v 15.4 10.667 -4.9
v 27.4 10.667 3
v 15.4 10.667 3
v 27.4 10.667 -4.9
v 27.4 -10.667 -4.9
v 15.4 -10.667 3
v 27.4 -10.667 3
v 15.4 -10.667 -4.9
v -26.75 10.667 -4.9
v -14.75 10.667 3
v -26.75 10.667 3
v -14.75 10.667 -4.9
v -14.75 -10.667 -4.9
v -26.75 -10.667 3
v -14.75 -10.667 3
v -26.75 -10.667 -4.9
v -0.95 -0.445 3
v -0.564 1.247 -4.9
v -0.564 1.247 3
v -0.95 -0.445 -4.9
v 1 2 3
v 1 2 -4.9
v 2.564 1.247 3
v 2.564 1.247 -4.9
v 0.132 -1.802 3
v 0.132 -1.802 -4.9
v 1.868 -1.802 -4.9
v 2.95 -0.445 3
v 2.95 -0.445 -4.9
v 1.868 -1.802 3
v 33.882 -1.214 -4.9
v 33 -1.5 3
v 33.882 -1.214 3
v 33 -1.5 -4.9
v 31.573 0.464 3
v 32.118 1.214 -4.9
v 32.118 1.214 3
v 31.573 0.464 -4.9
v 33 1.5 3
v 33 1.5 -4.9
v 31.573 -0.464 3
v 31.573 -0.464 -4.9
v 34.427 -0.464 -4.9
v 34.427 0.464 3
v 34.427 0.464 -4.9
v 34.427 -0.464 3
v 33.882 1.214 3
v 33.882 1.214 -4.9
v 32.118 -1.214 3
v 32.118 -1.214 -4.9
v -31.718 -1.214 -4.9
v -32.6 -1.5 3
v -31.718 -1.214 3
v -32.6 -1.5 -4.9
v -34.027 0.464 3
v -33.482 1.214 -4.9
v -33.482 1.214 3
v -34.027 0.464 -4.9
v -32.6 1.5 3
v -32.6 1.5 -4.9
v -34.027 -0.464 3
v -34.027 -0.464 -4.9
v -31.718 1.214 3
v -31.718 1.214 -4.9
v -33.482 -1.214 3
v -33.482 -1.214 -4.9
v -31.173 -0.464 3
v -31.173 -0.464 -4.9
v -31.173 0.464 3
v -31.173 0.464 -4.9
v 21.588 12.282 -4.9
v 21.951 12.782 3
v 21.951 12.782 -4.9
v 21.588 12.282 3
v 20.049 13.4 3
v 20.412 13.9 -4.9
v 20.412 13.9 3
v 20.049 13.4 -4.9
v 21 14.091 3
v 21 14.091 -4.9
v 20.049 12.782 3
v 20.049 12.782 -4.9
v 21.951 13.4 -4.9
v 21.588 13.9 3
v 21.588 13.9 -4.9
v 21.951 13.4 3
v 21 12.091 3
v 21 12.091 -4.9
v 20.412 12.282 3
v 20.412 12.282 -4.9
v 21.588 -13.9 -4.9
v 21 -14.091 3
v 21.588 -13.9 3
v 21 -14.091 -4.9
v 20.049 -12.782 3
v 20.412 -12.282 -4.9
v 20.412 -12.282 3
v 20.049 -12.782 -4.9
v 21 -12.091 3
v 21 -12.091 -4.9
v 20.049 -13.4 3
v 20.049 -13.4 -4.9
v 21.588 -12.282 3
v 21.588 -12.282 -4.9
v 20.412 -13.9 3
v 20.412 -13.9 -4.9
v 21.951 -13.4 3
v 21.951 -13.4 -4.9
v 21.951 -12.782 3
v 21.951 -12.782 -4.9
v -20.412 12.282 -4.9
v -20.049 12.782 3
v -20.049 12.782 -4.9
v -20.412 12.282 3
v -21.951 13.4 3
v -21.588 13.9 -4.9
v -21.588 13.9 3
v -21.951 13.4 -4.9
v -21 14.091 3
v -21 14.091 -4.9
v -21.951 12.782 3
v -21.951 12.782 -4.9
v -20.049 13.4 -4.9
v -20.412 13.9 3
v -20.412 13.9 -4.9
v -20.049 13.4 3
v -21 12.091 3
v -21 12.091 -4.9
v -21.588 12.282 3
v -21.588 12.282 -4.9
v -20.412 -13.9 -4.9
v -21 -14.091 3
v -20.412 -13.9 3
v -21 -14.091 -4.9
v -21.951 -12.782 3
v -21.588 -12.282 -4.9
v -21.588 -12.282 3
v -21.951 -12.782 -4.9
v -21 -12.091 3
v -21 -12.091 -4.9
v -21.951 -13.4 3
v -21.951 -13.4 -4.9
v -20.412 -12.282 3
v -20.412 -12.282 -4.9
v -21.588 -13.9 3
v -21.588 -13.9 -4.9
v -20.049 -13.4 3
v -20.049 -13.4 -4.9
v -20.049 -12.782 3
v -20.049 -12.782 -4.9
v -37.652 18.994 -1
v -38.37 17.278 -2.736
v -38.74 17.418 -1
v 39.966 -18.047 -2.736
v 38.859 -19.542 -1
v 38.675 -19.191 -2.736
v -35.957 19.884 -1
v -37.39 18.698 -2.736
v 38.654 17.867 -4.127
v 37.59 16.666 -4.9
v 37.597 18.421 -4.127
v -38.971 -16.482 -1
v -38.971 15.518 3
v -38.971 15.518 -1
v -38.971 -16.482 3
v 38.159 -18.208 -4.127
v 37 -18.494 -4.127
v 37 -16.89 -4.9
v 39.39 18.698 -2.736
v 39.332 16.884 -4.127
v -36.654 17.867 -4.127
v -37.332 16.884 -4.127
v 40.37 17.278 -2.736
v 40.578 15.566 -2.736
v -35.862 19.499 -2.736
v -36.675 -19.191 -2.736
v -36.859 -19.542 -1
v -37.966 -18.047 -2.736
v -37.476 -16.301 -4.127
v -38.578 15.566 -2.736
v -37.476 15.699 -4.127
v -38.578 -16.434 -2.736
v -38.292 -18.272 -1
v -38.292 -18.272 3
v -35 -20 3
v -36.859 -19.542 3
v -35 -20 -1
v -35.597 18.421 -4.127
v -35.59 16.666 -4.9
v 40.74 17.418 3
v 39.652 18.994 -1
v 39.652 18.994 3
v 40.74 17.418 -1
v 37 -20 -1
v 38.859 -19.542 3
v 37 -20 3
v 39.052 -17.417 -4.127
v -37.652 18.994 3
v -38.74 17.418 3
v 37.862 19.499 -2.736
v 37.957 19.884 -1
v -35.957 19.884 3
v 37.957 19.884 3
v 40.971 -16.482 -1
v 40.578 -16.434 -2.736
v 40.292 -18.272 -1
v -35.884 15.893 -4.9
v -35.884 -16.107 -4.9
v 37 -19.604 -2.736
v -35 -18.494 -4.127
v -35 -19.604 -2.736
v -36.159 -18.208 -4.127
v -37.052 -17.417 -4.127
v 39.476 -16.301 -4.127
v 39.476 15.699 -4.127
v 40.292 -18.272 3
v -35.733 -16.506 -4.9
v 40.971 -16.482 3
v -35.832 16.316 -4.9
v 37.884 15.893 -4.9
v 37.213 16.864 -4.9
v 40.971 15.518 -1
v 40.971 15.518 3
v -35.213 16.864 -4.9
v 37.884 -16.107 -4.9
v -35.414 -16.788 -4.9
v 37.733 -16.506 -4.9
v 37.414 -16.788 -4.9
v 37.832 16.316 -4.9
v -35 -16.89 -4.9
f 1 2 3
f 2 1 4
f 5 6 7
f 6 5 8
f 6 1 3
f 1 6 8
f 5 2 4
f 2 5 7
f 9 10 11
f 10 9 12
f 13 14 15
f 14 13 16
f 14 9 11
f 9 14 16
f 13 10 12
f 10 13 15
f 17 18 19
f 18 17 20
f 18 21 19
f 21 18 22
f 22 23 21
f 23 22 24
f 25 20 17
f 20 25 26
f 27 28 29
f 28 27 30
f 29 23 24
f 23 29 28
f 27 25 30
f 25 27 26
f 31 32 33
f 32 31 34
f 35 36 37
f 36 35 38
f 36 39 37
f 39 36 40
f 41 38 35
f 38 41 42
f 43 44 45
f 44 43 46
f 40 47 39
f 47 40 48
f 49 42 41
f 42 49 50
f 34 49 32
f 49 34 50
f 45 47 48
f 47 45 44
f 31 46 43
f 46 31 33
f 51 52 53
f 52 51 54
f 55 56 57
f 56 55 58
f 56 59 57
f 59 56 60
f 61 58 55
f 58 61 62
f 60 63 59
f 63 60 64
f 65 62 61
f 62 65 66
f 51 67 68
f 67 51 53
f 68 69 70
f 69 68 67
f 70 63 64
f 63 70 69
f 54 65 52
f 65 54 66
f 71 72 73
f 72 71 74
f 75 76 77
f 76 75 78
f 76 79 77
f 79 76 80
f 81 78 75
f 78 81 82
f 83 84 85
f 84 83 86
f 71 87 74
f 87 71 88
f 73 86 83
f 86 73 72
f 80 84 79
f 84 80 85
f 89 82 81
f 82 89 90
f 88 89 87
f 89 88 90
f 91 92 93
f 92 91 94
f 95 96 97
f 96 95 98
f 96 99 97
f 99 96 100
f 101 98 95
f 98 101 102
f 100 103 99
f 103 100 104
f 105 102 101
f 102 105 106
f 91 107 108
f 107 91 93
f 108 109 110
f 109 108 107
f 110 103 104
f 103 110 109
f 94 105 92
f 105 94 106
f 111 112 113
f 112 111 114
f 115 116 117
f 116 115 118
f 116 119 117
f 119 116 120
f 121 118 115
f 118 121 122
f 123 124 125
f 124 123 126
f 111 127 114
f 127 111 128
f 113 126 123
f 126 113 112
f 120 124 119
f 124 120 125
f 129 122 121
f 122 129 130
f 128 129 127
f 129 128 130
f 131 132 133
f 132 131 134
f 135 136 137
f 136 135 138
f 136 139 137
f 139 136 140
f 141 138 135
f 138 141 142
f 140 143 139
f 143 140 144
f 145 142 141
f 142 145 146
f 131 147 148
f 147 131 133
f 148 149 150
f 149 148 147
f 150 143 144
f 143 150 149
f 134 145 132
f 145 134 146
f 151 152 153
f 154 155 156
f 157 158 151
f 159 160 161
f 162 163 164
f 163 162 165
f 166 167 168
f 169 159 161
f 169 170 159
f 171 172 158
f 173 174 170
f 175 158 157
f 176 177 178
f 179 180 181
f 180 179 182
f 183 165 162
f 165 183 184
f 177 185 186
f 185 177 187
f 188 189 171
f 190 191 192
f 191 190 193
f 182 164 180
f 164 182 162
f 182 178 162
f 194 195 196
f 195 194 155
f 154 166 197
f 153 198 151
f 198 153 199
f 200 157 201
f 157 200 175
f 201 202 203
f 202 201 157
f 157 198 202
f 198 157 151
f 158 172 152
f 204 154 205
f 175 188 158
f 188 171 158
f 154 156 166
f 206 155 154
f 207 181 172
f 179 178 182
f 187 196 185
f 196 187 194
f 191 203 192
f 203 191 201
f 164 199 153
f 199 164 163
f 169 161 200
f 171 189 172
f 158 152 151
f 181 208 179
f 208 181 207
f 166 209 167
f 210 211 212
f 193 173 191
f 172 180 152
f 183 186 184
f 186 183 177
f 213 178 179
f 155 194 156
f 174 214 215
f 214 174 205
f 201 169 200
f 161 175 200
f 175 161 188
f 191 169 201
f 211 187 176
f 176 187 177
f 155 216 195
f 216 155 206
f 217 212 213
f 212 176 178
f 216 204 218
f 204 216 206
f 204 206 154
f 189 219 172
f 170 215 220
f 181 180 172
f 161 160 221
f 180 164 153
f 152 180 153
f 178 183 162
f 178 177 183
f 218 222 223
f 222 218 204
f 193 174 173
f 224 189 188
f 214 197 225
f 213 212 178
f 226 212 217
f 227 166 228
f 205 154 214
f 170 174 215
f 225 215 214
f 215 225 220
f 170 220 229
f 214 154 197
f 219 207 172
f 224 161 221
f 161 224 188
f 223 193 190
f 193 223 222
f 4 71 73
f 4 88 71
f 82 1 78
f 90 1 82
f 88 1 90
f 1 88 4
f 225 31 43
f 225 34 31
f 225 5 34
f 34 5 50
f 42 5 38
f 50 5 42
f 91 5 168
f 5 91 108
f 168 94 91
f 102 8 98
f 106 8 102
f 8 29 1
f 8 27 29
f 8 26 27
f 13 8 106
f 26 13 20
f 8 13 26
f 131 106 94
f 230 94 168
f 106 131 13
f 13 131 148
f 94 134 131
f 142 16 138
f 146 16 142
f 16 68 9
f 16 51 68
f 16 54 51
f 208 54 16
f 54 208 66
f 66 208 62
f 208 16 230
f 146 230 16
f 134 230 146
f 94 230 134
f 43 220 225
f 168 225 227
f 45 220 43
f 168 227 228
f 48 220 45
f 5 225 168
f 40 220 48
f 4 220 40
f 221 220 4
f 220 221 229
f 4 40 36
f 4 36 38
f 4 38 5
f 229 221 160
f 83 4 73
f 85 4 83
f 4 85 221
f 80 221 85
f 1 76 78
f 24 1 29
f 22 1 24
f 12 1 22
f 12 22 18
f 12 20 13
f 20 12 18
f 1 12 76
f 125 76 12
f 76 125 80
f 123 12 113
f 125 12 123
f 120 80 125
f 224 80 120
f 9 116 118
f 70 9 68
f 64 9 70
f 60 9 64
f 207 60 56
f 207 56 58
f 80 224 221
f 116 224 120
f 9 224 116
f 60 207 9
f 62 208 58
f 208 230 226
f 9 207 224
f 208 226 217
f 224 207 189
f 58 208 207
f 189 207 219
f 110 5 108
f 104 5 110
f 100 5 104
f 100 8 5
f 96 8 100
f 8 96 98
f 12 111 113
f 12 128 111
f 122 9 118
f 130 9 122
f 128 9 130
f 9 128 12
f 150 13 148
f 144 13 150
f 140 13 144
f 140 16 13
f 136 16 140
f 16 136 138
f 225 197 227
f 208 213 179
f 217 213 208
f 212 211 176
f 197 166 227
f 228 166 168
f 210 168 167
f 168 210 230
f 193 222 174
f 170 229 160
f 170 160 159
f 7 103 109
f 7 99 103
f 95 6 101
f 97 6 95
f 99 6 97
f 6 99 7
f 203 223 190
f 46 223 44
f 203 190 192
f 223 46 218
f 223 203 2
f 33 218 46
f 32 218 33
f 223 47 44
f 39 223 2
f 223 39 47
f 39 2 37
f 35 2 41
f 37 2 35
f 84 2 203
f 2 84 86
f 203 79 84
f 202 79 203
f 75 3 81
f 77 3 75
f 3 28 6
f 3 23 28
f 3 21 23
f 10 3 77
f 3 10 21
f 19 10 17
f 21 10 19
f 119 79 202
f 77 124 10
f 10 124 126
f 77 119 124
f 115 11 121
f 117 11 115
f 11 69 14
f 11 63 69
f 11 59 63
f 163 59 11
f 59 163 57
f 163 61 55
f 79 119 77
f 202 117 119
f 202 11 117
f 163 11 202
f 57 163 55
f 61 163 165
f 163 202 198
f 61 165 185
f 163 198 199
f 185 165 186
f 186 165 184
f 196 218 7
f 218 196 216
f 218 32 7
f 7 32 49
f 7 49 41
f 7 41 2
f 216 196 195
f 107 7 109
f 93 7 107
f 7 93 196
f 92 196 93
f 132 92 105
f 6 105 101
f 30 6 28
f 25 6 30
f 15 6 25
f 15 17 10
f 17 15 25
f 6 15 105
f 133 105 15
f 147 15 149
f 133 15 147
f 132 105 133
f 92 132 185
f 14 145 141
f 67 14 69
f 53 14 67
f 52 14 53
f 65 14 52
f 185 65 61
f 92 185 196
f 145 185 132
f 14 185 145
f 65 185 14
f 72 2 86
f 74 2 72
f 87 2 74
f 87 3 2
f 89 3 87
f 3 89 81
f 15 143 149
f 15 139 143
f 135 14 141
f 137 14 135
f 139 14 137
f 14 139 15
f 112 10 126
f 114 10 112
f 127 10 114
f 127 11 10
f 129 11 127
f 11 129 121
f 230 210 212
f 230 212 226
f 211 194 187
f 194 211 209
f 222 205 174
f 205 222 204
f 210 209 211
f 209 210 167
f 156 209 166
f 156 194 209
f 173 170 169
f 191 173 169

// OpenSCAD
cubo_X = 32;
cubo_Y = 36;
cubo_Z = 4;
cubo_Radio = 4;

module crearCubo() {
    rotate([0,180,0])
    hull() {
    for (i=[0:3])
        translate([(i % 2) * cubo_X, (i - i % 2) * cubo_Y, 0]) {
            cylinder(r=cubo_Radio, h=1);
            translate([0, 0, cubo_Z])
                sphere(cubo_Radio);
        }
    }
}

module crearAgujeros() {
    translate([-cubo_X + (cubo_X/6), (cubo_Y - cubo_Y/5)/3, -40])
    cube([cubo_X * 2 / 3, cubo_Y / 3, 50]);
        
    translate([-cubo_X + (cubo_X/6), cubo_Y + (cubo_Y - cubo_Y/8)/2, -40])
    cube([cubo_X * 2 / 3, cubo_Y / 3, 50]);
        
    translate([-cubo_X/2, cubo_Y, -40])
    cylinder(r=2, h=50);
        
    translate([-cubo_X/2, cubo_Y/9, -40])
    cylinder(r=1.5, h=50, $fn=10);
        
    translate([-cubo_X/2, cubo_Y * 2 - (cubo_Y/15), -40])
    cylinder(r=1.5, h=50, $fn=10);    
        
          
    translate([-cubo_X/11, cubo_Y/2 - 2, -40])
    cylinder(r=1, h=50, $fn=10);       
        
    translate([-cubo_X + cubo_X/11, cubo_Y/2 - 2, -40])
    cylinder(r=1, h=50, $fn=10);     

    translate([-cubo_X/11, cubo_Y + cubo_Y/2 + 4, -40])
    cylinder(r=1, h=50, $fn=10);       
        
    translate([-cubo_X + cubo_X/11, cubo_Y + cubo_Y/2 + 4, -40])
    cylinder(r=1, h=50, $fn=10);     
}

rotate([0, 0, 90])
translate([16, -37, 3])
difference() {
    crearCubo();  
    #crearAgujeros();
}
